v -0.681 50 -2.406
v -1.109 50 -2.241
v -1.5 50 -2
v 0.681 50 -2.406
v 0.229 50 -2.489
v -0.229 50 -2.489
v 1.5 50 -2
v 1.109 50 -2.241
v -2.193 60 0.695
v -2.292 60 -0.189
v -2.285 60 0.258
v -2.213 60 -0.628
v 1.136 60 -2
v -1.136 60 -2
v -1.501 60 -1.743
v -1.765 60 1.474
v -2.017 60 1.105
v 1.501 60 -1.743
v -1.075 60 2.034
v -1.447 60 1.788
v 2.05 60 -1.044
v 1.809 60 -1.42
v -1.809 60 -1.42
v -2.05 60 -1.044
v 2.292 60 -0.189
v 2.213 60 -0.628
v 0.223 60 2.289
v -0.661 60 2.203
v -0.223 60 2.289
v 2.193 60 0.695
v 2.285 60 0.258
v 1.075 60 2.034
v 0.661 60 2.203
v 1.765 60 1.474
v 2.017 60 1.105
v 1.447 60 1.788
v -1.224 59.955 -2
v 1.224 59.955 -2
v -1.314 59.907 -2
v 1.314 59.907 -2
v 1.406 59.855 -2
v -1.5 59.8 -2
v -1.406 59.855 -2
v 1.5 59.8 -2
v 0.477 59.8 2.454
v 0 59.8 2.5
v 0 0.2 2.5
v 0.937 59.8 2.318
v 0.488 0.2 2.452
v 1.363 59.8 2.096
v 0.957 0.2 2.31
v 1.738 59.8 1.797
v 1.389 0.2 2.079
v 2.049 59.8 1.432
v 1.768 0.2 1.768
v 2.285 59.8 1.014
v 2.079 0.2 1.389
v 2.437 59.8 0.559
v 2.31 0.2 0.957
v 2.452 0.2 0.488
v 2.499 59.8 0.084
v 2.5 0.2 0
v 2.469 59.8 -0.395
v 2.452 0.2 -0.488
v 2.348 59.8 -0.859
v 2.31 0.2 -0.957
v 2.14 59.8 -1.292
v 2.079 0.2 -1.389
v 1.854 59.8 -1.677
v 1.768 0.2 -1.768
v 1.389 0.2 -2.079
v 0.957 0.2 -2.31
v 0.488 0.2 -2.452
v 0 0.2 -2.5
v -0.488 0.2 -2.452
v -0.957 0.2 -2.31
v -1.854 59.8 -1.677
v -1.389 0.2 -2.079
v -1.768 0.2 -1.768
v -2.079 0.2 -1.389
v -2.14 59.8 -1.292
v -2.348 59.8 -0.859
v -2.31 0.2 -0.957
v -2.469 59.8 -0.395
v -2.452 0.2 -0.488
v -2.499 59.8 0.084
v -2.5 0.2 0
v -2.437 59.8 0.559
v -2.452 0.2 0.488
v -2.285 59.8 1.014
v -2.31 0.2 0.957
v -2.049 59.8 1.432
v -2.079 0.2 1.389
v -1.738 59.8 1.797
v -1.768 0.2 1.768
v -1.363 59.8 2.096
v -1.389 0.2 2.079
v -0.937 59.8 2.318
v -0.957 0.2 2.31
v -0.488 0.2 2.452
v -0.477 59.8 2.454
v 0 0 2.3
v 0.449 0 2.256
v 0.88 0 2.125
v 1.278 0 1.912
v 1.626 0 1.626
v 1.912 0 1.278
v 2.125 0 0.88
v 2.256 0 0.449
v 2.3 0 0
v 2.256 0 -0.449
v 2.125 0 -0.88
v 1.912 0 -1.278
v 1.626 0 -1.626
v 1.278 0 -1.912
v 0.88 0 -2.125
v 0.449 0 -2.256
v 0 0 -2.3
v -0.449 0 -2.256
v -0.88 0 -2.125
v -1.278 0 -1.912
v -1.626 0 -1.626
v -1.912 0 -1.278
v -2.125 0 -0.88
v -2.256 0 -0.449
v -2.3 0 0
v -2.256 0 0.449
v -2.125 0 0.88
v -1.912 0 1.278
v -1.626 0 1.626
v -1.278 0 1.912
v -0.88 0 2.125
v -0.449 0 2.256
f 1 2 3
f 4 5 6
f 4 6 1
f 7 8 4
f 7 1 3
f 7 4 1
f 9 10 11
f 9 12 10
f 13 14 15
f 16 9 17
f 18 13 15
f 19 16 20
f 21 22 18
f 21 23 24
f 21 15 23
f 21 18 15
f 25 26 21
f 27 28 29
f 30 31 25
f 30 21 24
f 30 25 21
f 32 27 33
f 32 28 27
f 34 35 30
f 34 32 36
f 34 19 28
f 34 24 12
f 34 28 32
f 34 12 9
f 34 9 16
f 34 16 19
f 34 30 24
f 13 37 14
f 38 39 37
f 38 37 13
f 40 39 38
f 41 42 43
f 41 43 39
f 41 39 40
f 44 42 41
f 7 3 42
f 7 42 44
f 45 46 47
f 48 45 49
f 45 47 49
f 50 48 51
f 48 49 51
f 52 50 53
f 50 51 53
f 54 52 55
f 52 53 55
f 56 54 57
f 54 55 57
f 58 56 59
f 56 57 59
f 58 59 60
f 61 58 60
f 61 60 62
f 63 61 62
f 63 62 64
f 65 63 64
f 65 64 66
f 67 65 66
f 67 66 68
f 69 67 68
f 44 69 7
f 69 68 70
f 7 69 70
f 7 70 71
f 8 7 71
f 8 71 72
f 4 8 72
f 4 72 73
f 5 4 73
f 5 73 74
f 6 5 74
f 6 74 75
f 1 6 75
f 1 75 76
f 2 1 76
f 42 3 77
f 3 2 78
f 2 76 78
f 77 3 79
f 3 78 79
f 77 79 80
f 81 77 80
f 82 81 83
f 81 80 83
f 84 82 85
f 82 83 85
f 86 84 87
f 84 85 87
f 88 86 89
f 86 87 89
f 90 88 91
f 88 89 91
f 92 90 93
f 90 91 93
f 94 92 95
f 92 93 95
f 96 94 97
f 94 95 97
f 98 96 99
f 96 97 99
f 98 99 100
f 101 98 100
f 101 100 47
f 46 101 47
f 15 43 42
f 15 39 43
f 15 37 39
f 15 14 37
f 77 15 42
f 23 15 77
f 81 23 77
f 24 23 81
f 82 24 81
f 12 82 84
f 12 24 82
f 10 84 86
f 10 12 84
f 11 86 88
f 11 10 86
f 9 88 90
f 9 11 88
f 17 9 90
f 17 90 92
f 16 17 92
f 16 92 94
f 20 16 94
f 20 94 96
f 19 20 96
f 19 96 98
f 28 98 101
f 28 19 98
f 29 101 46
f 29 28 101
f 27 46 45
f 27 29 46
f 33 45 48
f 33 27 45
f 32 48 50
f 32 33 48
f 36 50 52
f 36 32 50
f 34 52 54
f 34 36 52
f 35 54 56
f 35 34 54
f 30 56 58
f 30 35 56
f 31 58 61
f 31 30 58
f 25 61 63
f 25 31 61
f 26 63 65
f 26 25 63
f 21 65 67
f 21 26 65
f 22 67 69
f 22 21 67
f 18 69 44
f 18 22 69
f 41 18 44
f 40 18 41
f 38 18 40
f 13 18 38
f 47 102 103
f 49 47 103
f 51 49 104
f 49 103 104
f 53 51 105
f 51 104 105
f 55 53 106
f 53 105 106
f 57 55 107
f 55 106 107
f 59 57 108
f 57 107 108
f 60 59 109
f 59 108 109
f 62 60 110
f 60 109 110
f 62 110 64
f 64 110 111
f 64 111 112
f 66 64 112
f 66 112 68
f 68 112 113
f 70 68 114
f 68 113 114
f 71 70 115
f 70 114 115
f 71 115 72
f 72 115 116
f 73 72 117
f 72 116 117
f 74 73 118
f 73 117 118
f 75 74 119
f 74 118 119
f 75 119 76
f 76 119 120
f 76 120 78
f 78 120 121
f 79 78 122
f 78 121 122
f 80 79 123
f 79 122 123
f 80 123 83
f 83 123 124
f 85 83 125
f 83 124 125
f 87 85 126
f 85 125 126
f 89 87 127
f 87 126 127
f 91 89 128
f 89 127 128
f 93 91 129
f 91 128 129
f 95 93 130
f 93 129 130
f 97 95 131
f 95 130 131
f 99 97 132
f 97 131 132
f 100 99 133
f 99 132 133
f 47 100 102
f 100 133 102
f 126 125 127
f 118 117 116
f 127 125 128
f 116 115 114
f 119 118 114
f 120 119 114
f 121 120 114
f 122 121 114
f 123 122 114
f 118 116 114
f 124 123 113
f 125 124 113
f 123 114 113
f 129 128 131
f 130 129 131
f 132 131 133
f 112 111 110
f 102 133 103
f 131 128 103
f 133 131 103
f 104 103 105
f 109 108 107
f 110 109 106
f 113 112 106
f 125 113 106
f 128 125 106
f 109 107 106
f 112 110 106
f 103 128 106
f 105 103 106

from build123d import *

# Parameters (mm, degrees)
CROQUIS1_R              = 2.5
SALIENTE_EXTRUIR1_DEPTH = 60
CORTAR_EXTRUIR1_START   = -10
CORTAR_EXTRUIR1_DEPTH   = 10
CHAFL_N1_SIZE           = 0.2


with BuildPart() as part:
    # Croquis1 → Saliente-Extruir1 (new body)
    with BuildSketch(Plane(origin=(0, 0, 0), x_dir=(1, 0, 0), z_dir=(0, 1, 0))):
        with Locations(Location((0, 0, 0), (0, 0, 270))):
            Circle(CROQUIS1_R)
    extrude(amount=SALIENTE_EXTRUIR1_DEPTH)

    # Croquis2 → Cortar-Extruir1 (cut)
    with BuildSketch(Plane(origin=(0, 60, 0), x_dir=(1, 0, 0), z_dir=(0, 1, 0)).offset(CORTAR_EXTRUIR1_START)):
        with BuildLine():
            Line((-1.5, 2), (1.5, 2))
            ThreePointArc((1.5, 2), (0, 2.5), (-1.5, 2))
        make_face()
    extrude(amount=CORTAR_EXTRUIR1_DEPTH, mode=Mode.SUBTRACT)

    # Chaflán1
    chafl_n1_edges = [part.edges().sort_by_distance(p)[0] for p in [
        (0, 0, -2.5),
        (-2.371708245, 60, 0.790569415),
    ]]
    chamfer(chafl_n1_edges, length=CHAFL_N1_SIZE)


solid = part.part
